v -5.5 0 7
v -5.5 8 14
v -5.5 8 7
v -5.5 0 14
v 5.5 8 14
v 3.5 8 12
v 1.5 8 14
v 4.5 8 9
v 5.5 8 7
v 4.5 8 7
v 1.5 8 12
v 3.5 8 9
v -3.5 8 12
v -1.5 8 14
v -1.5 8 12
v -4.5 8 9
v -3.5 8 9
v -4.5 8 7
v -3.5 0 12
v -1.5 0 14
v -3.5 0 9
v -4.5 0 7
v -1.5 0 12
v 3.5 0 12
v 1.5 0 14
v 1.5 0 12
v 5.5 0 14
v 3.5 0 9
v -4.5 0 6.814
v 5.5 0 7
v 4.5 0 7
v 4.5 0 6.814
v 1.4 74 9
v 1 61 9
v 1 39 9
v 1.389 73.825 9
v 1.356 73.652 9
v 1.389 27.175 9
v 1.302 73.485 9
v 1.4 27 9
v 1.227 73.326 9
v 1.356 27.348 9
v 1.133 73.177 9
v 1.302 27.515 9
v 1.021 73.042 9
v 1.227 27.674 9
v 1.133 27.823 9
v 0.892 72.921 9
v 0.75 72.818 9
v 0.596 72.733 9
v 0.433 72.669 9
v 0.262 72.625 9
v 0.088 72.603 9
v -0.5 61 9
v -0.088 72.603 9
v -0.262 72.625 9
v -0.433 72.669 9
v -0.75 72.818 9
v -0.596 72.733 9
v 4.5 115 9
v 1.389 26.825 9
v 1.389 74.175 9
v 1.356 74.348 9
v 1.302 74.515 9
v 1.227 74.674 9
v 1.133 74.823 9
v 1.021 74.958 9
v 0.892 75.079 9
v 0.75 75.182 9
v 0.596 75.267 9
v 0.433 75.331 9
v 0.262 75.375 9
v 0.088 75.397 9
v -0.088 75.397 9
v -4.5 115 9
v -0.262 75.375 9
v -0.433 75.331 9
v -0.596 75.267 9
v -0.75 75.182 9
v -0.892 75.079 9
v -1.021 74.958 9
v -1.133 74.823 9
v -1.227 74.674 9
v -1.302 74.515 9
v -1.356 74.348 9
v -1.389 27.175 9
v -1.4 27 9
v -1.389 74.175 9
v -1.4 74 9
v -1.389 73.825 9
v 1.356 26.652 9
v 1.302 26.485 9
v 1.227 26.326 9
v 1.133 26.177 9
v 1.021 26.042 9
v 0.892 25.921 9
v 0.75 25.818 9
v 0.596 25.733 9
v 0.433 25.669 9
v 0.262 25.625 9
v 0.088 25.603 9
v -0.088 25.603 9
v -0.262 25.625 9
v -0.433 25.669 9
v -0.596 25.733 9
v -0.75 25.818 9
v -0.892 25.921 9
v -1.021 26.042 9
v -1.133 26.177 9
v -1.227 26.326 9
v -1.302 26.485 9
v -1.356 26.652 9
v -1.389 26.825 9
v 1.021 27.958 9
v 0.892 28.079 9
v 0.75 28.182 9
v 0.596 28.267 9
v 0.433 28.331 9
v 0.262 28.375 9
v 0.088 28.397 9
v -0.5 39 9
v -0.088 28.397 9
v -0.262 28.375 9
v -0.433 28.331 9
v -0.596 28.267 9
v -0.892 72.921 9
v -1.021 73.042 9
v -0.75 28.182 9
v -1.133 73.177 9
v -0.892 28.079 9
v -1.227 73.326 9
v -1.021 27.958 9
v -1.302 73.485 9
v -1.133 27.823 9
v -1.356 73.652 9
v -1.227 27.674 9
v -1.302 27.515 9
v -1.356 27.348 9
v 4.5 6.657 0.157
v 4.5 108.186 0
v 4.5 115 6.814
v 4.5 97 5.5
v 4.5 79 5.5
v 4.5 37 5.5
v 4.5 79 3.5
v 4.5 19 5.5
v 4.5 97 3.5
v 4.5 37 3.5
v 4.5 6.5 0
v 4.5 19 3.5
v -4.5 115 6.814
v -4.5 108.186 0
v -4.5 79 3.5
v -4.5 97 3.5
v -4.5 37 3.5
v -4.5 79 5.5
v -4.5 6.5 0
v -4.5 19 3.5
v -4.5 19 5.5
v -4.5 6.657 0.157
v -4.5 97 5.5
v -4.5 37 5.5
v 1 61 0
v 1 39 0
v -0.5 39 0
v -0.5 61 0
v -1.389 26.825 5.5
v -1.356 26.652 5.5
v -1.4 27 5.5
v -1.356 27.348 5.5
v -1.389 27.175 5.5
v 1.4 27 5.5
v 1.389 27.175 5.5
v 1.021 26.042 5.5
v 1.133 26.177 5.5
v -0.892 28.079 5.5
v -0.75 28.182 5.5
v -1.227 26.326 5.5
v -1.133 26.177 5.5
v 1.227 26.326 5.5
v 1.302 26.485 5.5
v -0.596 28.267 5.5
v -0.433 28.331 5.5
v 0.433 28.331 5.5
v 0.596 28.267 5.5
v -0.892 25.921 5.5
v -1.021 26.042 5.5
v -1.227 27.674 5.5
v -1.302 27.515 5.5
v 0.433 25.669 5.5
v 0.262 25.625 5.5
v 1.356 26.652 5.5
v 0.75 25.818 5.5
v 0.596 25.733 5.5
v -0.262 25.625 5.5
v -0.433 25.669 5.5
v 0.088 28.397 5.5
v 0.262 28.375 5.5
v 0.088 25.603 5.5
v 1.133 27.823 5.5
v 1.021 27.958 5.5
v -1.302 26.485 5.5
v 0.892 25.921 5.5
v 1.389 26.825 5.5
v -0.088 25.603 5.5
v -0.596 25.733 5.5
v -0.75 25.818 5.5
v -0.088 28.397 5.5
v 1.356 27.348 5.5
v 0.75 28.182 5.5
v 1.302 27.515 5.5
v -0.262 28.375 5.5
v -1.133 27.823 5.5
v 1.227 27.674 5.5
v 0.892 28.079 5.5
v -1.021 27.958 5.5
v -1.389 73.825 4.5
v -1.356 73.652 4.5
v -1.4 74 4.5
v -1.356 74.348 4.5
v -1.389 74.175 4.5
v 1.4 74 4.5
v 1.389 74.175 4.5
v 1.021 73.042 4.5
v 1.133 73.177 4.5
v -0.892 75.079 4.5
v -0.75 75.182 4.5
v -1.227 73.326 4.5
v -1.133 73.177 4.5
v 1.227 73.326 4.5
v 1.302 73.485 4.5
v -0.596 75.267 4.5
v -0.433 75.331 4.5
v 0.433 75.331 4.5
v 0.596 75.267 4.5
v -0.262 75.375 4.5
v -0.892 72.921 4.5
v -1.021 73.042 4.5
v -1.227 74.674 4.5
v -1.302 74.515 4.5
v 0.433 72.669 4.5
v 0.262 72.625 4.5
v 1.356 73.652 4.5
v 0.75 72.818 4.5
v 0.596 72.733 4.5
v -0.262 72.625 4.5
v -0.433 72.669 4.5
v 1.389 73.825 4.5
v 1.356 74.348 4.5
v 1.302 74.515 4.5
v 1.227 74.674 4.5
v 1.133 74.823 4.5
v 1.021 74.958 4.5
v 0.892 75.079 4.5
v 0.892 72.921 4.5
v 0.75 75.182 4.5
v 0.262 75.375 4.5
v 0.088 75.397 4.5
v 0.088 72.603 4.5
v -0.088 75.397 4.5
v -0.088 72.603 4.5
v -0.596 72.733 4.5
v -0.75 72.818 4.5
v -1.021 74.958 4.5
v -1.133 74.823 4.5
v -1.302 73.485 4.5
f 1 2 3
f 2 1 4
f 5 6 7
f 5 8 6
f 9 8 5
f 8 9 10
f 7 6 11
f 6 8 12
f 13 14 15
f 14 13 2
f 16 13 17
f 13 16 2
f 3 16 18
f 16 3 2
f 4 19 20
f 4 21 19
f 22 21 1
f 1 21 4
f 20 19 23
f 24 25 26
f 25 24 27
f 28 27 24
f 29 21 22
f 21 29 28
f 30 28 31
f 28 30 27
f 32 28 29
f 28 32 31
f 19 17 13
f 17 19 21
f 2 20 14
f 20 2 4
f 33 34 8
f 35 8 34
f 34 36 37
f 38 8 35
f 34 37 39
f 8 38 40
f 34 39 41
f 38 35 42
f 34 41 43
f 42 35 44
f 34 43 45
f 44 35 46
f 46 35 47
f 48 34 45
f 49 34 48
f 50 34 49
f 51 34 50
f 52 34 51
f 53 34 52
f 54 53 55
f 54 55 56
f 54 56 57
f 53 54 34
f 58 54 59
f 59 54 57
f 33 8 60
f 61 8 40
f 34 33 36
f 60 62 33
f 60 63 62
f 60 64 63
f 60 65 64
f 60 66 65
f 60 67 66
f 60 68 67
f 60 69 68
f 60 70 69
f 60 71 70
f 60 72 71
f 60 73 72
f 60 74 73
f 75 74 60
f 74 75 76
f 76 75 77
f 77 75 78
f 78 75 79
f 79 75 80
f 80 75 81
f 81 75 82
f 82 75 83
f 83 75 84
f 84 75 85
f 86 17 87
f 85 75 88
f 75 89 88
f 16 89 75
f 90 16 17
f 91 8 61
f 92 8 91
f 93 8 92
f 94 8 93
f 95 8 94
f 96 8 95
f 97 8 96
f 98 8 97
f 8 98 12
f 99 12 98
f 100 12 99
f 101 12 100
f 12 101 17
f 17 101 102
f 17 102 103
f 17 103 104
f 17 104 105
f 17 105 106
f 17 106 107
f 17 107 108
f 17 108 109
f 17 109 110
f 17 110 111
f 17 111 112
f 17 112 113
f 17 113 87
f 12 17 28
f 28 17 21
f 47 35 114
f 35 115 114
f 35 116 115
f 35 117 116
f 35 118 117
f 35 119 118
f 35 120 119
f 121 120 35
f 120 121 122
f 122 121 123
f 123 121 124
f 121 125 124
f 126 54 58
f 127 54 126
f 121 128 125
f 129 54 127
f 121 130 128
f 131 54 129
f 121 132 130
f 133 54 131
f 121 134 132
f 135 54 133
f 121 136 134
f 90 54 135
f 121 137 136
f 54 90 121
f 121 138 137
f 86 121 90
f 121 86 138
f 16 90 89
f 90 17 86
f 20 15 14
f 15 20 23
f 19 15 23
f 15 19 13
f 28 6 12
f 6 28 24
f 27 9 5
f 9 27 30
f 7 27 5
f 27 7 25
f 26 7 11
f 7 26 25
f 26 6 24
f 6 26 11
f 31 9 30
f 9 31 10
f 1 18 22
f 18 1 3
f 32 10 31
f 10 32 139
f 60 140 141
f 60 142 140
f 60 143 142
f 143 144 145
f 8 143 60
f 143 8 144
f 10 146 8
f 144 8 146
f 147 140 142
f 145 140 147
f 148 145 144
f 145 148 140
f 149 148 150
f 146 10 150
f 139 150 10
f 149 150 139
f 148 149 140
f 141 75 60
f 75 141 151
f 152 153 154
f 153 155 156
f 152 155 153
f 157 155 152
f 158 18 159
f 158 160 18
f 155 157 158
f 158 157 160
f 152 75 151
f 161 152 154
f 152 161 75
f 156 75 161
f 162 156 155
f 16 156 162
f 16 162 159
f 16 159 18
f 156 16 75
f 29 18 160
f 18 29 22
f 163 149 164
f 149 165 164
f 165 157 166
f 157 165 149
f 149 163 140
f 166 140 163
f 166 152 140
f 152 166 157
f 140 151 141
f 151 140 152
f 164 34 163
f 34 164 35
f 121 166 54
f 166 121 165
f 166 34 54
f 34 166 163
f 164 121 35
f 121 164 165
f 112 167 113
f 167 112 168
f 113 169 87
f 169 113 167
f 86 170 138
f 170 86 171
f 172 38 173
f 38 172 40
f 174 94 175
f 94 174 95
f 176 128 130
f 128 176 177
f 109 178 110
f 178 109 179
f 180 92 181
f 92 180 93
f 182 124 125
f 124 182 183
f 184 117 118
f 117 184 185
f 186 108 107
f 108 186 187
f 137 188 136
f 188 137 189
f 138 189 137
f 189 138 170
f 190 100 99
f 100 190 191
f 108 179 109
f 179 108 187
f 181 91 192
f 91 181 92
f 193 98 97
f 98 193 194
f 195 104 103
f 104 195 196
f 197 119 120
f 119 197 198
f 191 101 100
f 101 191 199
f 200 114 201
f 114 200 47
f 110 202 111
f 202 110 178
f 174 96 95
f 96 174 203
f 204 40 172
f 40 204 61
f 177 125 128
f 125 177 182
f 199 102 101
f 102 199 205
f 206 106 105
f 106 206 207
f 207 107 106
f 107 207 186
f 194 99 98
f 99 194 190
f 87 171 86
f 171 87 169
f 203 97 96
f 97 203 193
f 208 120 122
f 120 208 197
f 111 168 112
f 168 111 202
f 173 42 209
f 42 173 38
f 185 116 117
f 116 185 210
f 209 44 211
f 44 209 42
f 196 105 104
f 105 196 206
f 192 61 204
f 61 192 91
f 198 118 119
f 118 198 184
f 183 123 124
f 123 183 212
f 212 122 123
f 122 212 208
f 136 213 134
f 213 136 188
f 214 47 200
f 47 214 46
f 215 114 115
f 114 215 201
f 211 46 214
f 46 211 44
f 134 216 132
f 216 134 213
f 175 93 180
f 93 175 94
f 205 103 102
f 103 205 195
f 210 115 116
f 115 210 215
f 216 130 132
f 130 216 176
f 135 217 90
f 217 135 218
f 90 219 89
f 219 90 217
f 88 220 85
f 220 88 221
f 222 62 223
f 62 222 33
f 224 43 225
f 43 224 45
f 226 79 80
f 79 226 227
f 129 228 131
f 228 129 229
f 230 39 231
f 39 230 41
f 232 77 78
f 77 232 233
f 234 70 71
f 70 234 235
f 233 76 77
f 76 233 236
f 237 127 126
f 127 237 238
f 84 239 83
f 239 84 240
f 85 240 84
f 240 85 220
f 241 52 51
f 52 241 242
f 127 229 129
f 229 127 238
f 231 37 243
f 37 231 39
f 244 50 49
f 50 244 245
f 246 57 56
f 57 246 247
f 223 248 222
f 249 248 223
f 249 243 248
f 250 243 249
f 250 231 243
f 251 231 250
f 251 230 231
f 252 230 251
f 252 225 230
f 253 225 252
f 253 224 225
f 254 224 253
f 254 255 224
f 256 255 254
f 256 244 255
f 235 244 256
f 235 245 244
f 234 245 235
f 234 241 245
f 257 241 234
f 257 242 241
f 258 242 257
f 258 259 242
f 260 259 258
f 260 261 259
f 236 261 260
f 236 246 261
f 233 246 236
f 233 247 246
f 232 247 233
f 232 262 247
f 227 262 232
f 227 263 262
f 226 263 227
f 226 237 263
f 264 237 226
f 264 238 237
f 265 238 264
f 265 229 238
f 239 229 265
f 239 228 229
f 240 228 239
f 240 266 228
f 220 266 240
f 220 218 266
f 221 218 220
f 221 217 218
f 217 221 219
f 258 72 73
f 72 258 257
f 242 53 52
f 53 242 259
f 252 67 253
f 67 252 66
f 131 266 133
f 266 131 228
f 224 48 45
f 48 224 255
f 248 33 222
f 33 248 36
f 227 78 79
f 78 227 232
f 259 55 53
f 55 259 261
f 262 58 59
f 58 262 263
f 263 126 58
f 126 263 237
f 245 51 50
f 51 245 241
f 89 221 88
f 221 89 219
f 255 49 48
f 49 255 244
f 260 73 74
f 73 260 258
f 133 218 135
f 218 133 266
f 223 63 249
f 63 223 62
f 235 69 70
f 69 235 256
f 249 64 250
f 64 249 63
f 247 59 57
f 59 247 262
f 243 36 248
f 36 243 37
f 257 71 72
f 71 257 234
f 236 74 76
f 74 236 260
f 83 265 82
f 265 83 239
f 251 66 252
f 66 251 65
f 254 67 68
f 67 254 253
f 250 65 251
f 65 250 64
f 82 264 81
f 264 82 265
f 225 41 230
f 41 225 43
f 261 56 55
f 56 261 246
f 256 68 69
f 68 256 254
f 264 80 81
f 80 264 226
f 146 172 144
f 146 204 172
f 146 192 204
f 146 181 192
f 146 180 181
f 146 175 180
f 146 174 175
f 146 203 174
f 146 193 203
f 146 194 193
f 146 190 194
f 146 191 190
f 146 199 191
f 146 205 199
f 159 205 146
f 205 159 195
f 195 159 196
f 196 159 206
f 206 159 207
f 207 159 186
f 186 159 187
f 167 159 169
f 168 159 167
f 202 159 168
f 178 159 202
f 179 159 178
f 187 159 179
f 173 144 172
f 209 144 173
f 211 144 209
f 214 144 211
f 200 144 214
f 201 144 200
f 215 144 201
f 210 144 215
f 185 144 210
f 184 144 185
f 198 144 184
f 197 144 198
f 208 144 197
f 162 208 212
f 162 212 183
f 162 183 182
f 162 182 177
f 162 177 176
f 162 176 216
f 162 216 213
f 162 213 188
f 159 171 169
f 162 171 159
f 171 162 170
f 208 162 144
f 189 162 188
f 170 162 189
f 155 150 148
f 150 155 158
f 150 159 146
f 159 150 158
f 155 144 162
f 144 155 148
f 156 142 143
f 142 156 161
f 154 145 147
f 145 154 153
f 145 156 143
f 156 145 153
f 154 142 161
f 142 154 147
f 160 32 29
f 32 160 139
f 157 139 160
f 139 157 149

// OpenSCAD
$fn=50;

KEEL_W=9.0;
KEEL_H=9.0;
KEEL_L=115;

module cable_clamp(y_position) {
    translate([1.5, y_position, 4.5]) {
        rotate([90, 0, 0]) {
            union() {
                // Vertical arm of the C-clamp 2
                translate([2.0, 0, 0]) cube([2, 5, 8]);
                // Horizontal arm of the C-clamp
                rotate([90, 0, 0])
                translate([0, 0, -5]) cube([2, 8, 2]);
                // Vertical arm of the C-clamp 1
                translate([-7, 0, 0]) cube([2, 5, 8]);
                // Horizontal arm of the C-clamp
                rotate([90, 0, 0])
                translate([-5.0, 0,-5]) cube([2, 8, 2]);
                // clamp bed
                rotate([90, 0, 0])
                translate([-7.0, 0,-0]) cube([11, 8, 2]);
            }
        }
    }
}

module cutout_group(y_position) {
    translate([0, y_position, 0]) {
        
        // front of keel slope
        translate([-5, -KEEL_L-1, -3])
        rotate([-45, 0, 0])
        //(x, z, y)
        cube([10, 11, 8]); 

        //center cutout - vent
        translate([-1.0, -34.0, -5.0])
        rotate([90,0,0])
        //y, z, x
        cube([1.5, 10, 22]);

        // screw holes
        translate([0, -22, 0]) cylinder(h=5, d=2.8); 
        translate([0.0, -69, 0]) cylinder(h=5, d=2.8);   

        // thru slots for straps
        translate([-7.0, -32,-1]) cube([14, 18, 2]);       
        translate([-7.0, -92,-1]) cube([14, 18, 2]);
        
    }
}

// translate and rotate so model starts at 0, 0, 0
// someone tell me why this has to be done by hand?
translate([0, 0, KEEL_H/2]) {
    rotate([180, 180, 0]) { // Flipping the entire object along the Y axis
        difference() {
            union() {           
                // keel
                rotate([90,0,0])
                linear_extrude(KEEL_L) square([KEEL_W, KEEL_H], center=true); 
                // cable clamp
                cable_clamp(0);
                // measuring posts
                //translate([0,  MOUNT_HOLE_OFFSET+15, 0]) cylinder(h=7, d=1.0);            
                //translate([0, MOUNT_HOLE_OFFSET+30, 0]) cylinder(h=7, d=1.0);
            }
            
            cutout_group(-5);
            
            // rear of keel slope
            translate([-5, -1, -10])
            rotate([45, 0, 0])
            //(x, z, y)
            cube([10, 11, 8]);  
        }
    }
}
